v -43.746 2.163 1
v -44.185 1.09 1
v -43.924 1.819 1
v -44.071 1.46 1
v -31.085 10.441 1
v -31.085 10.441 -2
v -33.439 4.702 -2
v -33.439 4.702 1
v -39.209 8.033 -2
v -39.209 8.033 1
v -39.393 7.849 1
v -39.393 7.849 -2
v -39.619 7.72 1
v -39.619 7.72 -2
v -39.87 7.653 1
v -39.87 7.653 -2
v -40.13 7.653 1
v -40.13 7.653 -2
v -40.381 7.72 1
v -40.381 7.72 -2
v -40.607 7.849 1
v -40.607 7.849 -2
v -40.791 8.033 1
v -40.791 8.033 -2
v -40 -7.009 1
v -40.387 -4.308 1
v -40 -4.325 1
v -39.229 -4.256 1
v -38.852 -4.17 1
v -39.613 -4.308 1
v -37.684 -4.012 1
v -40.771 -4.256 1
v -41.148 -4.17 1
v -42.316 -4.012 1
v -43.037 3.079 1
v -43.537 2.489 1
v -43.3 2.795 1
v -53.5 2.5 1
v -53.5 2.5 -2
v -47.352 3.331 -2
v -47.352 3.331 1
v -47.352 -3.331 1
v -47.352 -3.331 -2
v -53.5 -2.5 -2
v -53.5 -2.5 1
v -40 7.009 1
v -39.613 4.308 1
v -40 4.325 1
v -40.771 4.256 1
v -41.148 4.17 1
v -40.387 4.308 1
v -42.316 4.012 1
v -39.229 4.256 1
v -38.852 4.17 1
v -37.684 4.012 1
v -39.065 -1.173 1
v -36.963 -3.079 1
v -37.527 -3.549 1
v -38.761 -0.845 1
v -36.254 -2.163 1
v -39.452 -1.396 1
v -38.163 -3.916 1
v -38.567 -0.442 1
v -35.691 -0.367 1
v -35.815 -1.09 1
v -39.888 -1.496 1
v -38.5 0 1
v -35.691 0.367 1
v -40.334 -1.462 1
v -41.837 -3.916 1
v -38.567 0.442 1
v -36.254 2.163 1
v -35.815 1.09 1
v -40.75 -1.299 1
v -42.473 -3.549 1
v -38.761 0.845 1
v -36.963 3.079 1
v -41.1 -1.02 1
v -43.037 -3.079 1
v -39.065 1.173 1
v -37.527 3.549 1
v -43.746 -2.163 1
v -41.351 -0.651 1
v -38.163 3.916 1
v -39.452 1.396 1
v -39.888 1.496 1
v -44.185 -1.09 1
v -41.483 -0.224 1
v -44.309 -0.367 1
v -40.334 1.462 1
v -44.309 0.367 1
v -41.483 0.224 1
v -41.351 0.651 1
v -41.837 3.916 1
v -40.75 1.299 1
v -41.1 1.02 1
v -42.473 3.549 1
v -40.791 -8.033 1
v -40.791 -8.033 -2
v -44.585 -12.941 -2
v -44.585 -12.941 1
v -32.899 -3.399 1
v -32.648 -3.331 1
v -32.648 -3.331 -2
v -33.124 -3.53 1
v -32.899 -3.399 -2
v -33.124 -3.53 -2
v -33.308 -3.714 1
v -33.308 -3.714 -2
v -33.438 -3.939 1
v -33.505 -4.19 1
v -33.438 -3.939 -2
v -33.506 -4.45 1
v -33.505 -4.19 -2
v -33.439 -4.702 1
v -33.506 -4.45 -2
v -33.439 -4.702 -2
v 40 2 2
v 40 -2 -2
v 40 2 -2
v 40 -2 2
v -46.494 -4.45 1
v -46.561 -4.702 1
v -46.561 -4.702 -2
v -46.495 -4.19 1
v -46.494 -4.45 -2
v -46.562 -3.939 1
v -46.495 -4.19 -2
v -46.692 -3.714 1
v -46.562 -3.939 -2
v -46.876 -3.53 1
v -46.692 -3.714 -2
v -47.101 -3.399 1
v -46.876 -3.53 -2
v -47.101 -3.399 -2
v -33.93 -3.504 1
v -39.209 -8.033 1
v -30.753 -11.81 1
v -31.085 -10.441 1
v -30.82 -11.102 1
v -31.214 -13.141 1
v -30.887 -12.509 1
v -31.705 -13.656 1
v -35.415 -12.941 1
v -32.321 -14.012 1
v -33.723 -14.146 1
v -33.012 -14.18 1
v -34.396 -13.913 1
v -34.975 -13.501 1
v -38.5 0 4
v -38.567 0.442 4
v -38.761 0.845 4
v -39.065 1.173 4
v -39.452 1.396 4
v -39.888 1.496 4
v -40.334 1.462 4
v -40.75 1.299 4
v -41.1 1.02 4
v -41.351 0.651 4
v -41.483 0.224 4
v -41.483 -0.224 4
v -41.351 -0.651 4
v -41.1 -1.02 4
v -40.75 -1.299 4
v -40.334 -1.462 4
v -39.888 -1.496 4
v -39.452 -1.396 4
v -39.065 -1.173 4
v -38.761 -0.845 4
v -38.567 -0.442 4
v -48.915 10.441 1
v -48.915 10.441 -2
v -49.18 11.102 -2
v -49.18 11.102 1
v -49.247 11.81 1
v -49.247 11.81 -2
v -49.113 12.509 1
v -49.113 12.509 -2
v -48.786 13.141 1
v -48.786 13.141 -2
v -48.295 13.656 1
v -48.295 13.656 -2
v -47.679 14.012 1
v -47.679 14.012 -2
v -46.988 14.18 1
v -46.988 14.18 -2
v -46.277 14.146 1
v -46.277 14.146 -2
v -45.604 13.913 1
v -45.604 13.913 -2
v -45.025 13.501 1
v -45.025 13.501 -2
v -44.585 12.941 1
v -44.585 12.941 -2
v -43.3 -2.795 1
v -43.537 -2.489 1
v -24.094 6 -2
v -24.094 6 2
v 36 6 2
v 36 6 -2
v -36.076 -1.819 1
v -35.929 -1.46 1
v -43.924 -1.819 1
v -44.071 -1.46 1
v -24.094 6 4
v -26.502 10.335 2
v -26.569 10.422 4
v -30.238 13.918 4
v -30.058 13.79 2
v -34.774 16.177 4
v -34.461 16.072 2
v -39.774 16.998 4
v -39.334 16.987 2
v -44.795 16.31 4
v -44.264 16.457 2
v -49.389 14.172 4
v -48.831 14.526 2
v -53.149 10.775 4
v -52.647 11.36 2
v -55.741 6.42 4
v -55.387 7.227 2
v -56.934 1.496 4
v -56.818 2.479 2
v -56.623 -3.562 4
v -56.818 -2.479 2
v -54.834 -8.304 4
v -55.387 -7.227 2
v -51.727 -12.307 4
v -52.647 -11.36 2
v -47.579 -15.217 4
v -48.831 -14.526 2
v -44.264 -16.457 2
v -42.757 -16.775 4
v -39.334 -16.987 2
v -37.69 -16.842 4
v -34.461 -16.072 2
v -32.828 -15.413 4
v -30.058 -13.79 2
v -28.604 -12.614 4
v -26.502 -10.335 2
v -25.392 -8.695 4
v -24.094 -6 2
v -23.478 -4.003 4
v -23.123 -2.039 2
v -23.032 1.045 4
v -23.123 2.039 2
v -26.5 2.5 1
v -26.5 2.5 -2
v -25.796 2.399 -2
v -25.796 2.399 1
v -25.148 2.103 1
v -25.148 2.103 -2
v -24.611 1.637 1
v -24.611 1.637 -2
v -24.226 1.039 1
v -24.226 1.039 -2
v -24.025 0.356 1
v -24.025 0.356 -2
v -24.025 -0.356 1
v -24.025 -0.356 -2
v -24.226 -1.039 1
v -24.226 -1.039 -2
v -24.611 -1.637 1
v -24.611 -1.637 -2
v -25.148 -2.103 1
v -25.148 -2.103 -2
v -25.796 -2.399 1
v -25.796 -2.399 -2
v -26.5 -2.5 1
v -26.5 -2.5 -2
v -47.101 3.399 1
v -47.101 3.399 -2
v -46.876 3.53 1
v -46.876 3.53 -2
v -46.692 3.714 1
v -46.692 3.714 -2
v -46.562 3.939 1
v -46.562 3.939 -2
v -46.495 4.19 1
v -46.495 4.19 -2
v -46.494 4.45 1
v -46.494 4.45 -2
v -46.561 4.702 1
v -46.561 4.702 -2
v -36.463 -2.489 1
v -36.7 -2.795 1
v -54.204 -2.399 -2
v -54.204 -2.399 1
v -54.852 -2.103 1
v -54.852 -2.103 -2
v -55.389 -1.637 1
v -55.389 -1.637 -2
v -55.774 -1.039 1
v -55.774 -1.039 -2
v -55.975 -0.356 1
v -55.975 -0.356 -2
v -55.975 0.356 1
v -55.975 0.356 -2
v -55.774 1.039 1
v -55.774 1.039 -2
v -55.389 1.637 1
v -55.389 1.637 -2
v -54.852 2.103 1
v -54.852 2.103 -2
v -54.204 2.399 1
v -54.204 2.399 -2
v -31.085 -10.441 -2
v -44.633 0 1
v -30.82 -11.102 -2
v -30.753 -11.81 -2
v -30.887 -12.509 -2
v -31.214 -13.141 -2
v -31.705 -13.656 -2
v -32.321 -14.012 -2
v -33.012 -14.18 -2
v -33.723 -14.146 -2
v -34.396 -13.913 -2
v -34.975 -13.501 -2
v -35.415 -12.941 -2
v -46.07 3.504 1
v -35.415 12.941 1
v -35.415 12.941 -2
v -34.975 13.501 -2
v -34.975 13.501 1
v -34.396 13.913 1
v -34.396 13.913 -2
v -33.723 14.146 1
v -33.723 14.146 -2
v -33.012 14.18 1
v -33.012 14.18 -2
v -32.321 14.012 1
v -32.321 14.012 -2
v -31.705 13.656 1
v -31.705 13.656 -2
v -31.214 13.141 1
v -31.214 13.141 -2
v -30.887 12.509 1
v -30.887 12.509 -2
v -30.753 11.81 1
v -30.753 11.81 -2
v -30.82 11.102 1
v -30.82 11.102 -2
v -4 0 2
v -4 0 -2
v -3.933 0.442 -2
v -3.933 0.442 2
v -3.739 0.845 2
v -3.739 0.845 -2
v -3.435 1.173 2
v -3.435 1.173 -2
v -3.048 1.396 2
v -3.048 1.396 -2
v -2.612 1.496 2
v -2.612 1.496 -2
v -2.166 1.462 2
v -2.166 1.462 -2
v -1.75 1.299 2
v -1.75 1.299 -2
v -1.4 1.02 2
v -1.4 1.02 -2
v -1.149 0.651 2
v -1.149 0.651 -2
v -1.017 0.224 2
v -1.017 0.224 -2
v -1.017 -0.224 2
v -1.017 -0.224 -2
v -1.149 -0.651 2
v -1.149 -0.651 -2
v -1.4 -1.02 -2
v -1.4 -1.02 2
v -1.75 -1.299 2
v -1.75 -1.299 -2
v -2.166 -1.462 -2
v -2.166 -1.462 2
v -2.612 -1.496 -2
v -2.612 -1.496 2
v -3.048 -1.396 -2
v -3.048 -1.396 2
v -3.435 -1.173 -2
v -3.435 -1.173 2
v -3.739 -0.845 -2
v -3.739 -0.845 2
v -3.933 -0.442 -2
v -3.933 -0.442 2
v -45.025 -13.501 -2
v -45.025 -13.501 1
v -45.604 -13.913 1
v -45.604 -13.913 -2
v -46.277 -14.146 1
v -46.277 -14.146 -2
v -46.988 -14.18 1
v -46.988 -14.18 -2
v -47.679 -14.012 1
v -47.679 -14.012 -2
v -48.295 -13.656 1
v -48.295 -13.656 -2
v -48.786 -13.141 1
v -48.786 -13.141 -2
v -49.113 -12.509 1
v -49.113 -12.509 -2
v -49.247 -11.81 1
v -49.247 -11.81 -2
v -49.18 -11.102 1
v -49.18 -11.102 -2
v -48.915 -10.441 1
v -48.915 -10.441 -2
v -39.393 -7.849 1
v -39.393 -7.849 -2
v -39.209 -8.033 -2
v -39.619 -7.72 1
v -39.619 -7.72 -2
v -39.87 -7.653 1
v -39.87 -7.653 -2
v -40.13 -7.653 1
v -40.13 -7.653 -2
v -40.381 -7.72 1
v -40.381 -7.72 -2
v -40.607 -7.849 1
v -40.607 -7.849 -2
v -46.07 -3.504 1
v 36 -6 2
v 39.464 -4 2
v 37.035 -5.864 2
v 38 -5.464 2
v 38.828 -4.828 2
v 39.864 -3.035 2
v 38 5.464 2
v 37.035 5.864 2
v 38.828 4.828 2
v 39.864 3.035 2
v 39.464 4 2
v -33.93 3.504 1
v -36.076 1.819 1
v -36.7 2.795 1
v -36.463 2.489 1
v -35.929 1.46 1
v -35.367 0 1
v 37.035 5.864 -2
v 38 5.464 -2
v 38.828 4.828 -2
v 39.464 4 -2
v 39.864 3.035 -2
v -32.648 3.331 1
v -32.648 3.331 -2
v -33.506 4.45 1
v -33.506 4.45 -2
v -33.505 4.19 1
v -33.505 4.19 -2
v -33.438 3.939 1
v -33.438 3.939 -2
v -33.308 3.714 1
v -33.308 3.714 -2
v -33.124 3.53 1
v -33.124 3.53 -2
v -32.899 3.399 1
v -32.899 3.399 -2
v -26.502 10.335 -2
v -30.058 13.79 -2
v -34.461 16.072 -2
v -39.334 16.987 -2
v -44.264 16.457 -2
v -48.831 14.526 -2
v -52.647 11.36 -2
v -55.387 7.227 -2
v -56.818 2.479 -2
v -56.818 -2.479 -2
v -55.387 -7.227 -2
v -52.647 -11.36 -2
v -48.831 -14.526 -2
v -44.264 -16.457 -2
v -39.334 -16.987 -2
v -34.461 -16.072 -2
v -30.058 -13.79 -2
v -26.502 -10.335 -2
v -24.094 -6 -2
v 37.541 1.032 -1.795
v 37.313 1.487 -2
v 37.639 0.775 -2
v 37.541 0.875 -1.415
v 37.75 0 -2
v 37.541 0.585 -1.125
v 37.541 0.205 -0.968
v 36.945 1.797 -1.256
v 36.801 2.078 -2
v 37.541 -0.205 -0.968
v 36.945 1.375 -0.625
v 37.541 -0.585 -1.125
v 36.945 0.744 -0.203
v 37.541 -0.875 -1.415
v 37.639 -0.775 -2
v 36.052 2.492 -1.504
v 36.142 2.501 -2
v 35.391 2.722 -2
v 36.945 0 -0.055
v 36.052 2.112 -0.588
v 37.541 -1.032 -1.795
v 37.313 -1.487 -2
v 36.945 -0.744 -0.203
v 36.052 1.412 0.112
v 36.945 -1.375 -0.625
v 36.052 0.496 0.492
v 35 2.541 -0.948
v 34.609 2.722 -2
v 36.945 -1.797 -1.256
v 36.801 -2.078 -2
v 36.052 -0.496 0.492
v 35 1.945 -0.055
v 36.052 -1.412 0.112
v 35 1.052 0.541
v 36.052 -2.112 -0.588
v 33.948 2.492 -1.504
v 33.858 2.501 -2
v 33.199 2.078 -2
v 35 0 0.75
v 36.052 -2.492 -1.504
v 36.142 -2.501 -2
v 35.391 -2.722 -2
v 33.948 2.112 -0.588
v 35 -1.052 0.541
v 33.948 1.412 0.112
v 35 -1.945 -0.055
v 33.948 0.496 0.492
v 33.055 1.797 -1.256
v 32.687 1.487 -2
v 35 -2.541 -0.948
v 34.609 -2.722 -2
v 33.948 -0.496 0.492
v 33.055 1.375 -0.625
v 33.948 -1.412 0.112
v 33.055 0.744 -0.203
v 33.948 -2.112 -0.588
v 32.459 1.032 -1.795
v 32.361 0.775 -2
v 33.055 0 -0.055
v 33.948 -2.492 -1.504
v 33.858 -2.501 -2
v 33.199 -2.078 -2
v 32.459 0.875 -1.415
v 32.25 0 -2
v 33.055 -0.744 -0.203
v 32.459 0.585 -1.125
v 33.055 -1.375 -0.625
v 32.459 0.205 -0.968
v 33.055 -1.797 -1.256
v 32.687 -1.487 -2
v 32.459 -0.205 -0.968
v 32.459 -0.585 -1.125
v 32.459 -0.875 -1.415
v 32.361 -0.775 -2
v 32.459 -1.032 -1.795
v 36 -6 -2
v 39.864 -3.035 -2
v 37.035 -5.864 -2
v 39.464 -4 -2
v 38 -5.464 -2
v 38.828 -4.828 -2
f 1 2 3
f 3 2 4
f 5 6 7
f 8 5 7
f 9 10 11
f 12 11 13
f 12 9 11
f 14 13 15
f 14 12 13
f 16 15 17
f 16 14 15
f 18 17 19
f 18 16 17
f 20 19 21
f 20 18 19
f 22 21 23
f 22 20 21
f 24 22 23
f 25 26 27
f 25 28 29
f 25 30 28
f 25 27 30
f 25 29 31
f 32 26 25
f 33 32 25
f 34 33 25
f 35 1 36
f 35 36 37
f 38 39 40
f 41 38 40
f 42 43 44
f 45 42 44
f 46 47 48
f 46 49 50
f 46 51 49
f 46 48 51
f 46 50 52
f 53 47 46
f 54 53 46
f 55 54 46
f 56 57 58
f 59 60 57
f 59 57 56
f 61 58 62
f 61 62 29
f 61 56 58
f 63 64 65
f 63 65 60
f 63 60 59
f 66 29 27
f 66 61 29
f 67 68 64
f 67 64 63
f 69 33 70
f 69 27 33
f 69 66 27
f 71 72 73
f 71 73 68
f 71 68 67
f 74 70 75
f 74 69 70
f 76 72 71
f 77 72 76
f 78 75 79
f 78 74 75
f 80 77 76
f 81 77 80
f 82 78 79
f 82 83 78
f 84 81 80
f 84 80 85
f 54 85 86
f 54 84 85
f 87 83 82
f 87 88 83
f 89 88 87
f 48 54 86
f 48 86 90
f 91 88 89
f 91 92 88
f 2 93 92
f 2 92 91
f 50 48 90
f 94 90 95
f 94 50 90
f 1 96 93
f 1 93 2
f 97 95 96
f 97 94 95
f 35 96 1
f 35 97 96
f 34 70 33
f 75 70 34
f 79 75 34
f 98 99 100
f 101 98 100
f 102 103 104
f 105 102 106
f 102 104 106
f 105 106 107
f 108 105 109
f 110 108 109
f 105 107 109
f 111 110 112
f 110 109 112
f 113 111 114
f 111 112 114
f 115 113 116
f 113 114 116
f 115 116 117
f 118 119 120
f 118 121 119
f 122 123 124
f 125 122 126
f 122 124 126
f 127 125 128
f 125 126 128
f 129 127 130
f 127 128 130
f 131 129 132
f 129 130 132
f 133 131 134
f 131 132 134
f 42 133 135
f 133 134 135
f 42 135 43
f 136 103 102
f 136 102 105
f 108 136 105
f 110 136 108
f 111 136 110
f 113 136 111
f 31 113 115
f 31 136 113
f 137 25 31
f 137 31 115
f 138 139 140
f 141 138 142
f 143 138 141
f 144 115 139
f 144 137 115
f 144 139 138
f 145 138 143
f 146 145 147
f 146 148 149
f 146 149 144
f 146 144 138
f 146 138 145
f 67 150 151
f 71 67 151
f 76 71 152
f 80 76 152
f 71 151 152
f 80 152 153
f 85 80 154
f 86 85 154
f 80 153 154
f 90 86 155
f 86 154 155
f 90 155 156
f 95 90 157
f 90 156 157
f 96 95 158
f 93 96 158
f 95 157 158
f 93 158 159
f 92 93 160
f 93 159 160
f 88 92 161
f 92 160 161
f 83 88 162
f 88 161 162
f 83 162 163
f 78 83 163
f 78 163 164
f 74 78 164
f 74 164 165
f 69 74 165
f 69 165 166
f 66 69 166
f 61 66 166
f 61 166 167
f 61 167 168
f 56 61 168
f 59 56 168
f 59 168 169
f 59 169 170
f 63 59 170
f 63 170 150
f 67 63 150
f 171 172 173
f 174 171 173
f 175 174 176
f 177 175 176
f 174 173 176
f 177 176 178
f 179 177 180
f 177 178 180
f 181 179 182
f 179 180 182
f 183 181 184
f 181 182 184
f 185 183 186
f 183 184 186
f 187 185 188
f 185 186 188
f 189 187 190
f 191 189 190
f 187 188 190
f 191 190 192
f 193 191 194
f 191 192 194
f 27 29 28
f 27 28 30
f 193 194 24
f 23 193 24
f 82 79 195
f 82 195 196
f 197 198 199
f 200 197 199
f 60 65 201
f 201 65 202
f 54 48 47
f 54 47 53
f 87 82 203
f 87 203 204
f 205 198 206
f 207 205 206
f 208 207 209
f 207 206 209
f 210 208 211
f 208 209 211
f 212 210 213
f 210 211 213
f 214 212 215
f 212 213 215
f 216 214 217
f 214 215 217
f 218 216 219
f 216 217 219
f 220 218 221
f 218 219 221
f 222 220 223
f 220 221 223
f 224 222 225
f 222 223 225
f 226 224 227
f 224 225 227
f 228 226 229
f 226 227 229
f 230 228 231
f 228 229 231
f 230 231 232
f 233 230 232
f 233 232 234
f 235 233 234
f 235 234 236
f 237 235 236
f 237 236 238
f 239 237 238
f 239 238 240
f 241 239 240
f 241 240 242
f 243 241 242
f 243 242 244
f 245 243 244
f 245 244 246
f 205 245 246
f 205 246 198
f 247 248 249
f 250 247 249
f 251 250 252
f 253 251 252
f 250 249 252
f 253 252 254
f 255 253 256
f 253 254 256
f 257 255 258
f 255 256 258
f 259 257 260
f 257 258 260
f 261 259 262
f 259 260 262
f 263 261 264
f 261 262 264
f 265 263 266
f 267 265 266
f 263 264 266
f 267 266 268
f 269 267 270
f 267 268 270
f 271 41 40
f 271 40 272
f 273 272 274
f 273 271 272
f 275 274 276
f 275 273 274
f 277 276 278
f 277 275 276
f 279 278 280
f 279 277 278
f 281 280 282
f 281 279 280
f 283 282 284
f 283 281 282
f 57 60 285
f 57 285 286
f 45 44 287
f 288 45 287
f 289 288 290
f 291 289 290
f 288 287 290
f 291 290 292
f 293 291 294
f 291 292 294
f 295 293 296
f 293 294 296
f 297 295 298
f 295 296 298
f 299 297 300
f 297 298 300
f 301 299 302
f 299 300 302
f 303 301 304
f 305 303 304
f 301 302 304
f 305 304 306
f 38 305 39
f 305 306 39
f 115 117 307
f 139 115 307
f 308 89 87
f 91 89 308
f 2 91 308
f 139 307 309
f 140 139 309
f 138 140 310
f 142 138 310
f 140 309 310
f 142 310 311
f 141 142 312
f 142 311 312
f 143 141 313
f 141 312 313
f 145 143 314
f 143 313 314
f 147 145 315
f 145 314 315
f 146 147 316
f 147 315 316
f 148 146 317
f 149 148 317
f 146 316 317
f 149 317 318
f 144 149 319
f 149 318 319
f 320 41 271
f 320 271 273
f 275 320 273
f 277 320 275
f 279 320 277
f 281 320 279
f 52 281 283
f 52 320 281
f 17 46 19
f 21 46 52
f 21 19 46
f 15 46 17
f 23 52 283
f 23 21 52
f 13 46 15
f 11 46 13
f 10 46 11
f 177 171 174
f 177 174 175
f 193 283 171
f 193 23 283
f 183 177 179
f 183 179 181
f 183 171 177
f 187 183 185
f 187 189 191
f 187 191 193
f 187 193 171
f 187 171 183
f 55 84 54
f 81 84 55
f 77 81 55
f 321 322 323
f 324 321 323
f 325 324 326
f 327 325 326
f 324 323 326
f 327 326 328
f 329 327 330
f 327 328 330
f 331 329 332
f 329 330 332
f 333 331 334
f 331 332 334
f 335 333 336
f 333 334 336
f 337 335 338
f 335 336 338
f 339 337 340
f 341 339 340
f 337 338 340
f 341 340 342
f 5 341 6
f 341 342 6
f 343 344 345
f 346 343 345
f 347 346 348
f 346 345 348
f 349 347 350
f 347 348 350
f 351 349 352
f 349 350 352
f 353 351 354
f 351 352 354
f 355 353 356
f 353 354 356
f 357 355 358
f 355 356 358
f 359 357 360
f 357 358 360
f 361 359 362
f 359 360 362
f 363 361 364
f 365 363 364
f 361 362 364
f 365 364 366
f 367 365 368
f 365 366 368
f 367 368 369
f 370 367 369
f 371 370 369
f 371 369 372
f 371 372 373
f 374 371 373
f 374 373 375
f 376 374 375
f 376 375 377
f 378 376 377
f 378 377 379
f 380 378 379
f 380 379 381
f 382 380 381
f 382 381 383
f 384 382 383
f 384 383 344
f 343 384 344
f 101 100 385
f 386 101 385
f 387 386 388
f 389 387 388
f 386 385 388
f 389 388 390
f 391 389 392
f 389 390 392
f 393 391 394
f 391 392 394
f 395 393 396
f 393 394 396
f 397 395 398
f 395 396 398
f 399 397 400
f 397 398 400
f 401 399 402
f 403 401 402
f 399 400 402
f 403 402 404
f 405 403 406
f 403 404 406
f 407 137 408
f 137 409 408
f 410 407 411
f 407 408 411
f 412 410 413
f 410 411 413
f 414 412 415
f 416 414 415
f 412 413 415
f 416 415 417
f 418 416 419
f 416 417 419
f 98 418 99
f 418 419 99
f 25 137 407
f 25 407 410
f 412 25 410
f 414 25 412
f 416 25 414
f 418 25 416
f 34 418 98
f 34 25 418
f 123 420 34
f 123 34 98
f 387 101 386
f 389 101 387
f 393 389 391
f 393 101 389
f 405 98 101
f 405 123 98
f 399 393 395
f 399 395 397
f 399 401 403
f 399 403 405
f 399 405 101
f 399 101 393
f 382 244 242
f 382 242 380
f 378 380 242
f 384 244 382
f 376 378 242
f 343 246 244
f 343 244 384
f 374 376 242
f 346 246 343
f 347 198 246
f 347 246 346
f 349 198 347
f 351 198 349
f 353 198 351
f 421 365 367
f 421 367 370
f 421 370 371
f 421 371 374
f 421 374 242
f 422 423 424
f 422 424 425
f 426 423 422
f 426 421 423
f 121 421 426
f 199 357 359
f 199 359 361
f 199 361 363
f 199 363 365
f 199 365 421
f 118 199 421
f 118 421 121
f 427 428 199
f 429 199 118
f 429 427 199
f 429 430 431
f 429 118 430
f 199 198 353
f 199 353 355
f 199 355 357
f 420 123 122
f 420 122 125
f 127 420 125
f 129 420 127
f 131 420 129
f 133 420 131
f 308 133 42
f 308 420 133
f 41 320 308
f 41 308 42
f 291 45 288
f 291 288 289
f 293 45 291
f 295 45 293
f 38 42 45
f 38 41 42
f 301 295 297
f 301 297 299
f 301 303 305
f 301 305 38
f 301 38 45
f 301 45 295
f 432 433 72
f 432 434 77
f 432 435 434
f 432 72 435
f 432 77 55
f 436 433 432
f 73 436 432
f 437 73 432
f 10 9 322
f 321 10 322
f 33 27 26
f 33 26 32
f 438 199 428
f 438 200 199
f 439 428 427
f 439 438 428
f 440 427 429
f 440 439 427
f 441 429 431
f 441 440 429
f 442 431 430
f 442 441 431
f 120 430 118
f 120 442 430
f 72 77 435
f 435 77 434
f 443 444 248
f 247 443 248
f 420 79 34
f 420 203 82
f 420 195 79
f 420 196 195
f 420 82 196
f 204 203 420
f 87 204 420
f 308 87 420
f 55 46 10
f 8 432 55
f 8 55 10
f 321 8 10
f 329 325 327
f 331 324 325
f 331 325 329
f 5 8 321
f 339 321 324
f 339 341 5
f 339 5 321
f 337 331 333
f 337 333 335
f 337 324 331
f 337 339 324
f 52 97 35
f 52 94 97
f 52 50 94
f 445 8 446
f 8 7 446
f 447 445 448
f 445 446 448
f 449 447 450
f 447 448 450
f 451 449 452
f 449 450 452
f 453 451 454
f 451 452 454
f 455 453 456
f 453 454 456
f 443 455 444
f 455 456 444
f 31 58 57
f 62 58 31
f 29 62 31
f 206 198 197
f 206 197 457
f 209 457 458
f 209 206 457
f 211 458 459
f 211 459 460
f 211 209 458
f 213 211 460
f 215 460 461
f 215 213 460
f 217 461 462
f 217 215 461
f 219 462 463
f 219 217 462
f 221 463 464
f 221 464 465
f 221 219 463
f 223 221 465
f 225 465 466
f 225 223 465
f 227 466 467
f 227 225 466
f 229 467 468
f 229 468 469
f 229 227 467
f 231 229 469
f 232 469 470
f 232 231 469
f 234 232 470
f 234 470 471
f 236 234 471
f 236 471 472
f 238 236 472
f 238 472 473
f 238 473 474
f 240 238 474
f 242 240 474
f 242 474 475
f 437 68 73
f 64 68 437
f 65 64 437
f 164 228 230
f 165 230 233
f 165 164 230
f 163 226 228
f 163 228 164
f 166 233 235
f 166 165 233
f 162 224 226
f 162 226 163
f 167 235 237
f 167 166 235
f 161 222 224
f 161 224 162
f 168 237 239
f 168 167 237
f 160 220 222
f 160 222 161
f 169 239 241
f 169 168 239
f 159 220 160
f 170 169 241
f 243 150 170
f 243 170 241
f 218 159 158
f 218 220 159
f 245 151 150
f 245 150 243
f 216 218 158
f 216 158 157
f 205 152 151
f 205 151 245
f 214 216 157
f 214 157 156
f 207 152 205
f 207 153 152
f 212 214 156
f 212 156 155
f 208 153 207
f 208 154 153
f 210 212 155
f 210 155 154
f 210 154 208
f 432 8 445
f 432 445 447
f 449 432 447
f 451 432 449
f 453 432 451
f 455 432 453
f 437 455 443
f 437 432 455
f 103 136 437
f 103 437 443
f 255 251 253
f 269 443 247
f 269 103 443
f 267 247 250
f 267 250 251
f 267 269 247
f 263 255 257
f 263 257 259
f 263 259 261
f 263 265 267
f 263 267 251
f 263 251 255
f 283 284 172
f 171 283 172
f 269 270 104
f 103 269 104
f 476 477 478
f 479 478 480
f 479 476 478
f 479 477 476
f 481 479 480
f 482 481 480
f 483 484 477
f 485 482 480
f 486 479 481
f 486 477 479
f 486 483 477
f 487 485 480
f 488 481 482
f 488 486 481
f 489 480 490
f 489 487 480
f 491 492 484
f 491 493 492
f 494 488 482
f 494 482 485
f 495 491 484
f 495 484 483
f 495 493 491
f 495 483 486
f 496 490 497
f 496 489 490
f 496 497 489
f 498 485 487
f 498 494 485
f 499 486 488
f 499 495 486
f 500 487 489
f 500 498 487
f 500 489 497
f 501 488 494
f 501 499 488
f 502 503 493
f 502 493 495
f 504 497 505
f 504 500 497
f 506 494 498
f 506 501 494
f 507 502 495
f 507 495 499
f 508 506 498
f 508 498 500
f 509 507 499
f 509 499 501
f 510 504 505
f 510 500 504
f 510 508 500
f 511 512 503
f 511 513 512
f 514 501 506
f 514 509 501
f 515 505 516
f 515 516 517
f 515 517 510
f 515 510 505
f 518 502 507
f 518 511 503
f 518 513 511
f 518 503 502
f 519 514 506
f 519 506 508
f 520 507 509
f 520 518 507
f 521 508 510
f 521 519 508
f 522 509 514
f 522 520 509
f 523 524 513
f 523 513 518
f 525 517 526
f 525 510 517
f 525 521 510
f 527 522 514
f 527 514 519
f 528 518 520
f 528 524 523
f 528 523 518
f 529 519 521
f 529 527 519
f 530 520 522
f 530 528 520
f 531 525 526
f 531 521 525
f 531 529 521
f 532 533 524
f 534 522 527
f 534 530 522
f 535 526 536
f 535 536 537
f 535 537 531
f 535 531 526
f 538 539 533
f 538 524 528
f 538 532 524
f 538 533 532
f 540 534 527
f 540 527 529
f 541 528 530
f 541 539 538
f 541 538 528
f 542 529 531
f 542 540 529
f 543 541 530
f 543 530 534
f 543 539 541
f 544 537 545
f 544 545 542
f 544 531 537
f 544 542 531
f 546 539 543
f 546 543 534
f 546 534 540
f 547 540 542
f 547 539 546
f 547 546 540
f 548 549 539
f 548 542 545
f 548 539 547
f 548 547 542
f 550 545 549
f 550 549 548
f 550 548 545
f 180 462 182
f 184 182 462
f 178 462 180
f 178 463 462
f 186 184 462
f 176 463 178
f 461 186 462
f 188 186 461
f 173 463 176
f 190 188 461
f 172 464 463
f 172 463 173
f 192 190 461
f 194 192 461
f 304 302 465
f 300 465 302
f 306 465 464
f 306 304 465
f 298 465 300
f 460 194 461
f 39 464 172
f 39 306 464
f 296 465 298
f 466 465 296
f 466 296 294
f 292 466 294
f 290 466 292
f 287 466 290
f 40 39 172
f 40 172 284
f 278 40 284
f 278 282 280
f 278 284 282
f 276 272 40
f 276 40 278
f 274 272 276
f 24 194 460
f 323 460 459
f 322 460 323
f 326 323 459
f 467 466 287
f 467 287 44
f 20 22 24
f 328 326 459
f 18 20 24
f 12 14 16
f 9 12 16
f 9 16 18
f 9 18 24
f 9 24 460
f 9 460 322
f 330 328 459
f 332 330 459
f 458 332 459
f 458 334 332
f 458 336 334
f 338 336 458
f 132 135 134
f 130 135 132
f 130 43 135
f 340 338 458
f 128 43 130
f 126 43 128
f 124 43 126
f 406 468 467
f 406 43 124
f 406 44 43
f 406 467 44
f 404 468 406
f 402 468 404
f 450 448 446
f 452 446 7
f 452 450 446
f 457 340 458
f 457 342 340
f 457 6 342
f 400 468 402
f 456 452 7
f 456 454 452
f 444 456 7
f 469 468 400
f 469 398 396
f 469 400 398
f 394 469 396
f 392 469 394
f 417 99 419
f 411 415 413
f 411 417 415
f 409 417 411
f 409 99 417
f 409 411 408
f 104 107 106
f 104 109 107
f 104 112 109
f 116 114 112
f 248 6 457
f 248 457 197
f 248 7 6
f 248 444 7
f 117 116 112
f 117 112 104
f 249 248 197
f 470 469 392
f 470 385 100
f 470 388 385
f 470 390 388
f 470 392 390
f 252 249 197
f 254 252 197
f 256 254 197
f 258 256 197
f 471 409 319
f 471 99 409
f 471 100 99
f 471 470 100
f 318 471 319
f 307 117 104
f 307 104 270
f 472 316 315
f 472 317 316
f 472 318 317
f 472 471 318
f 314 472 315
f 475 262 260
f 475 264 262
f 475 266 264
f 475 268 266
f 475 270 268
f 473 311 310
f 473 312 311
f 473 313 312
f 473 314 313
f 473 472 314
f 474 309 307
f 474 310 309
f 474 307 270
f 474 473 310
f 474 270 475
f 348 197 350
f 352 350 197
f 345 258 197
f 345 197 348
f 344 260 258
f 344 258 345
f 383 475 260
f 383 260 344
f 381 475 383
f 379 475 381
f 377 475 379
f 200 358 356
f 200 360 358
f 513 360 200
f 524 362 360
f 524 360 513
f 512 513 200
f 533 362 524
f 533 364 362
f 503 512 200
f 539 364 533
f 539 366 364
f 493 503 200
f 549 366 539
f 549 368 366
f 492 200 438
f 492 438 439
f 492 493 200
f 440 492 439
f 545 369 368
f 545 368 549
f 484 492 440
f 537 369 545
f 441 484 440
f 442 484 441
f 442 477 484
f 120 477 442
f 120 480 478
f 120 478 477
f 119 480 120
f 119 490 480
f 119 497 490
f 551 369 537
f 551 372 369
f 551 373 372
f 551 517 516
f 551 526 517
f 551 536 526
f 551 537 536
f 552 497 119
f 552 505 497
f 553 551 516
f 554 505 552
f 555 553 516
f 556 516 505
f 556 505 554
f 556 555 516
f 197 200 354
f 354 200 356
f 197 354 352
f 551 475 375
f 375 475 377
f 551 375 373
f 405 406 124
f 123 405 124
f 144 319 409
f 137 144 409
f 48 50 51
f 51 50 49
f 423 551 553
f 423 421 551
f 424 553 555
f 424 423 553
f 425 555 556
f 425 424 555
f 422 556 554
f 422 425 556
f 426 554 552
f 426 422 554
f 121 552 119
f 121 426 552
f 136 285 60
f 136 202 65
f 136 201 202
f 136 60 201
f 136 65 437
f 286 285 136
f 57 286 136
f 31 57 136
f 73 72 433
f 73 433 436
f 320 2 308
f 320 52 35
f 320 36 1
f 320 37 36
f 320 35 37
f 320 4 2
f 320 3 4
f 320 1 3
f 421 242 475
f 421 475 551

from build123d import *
from build123d.topology import SkipClean

# Parameters (mm, degrees)
SKETCH1_W                       = 80
SKETCH1_H                       = 12
BOSS_EXTRUDE1_DEPTH             = 2
CUT_REVOLVE1_ANGLE              = 180
FILLET2_R                       = 4
BOSS_EXTRUDE2_REACH             = 42.645
SKETCH6_R                       = 17
BOSS_EXTRUDE2_DIRECTION_2_DEPTH = 2
SKETCH7_R                       = 2.5
CUT_EXTRUDE3_DEPTH              = 3
CIRPATTERN1_COUNT               = 6
FILLET3_R                       = 1
CUT_EXTRUDE4_REACH              = 61.783
SKETCH8_R                       = 1.5
CUT_EXTRUDE5_REACH              = 61.783
SKETCH9_R                       = 1.5


with BuildPart() as part:
    # Sketch1 → Boss-Extrude1 (new, symmetric)
    with BuildSketch(Plane.XY):
        Rectangle(SKETCH1_W, SKETCH1_H)
    extrude(amount=BOSS_EXTRUDE1_DEPTH, both=True)

    # Sketch3 → Cut-Revolve1 (revolve, cut)
    with SkipClean():  # the faces are left unmerged after this step: merging them gives an invalid solid
        with BuildSketch(Plane.XY.offset(-2)):
            with BuildLine():
                ThreePointArc((37.75, 0), (35, 2.75), (32.25, 0))
                Line((32.25, 0), (37.75, 0))
            make_face()
            with BuildLine():
                Line((37.75, 0), (32.25, 0))
                ThreePointArc((32.25, 0), (35, -2.75), (37.75, 0))
            make_face()
        revolve(axis=Axis((32.25, 0, -2), (1, 0, 0)), revolution_arc=CUT_REVOLVE1_ANGLE, mode=Mode.SUBTRACT)

    # Fillet2
    fillet2_edges = [part.edges().sort_by_distance(p)[0] for p in [
        (40, -6, 0),
        (40, 6, 0),
    ]]
    fillet(fillet2_edges, radius=FILLET2_R)

    # Boss-Extrude2: up to this face of the body (flat: up to its plane)
    boss_extrude2_end = Plane(part.part.faces().sort_by_distance((-1.183693998, 0, -2))[0])
    # Sketch6 → Boss-Extrude2 (add, up to the picked face)
    with BuildSketch(Plane.XY.offset(2), mode=Mode.PRIVATE) as boss_extrude2_sk1:
        with Locations(Location((-40, 0, 0), (0, 0, 20.667316494))):
            Circle(SKETCH6_R)
    boss_extrude2_tool1 = split(extrude(boss_extrude2_sk1.sketch, amount=-BOSS_EXTRUDE2_REACH, mode=Mode.PRIVATE), bisect_by=boss_extrude2_end, keep=Keep.BOTH, mode=Mode.PRIVATE)
    add(boss_extrude2_tool1.solids().sort_by(Axis((-40, 0, 2), (0, 0, -1)))[0])

    # Sketch6 → Boss-Extrude2 direction 2 (add)
    with BuildSketch(Plane.XY.offset(2)):
        with Locations(Location((-40, 0, 0), (0, 0, 20.667316494))):
            Circle(SKETCH6_R)
    extrude(amount=BOSS_EXTRUDE2_DIRECTION_2_DEPTH)

    # Sketch7 → Cut-Extrude3 (cut)
    with BuildSketch(Plane(origin=(0, 0, -2), x_dir=(-1, 0, 0), z_dir=(0, 0, -1))):
        with BuildLine():
            Line((41.148365434, 4.169758006), (40, 4.325))
            ThreePointArc((40, 4.325), (35.675, 0), (40, -4.325))
            Line((40, -4.325), (41.148365434, -4.169758006))
            ThreePointArc((41.148365434, -4.169758006), (43.440371019, -2.620967808), (44.325, 0))
            ThreePointArc((44.325, 0), (43.440371019, 2.620967808), (41.148365434, 4.169758006))
        make_face()
        with BuildLine():
            Line((53.5, 2.5), (41.148365434, 4.169758006))
            ThreePointArc((41.148365434, 4.169758006), (43.440371019, 2.620967808), (44.325, 0))
            ThreePointArc((44.325, 0), (43.440371019, -2.620967808), (41.148365434, -4.169758006))
            Line((41.148365434, -4.169758006), (53.5, -2.5))
            ThreePointArc((53.5, -2.5), (51, 0), (53.5, 2.5))
        make_face()
        with Locations((53.5, 0)):
            Circle(SKETCH7_R)
    cut_extrude3 = extrude(amount=-CUT_EXTRUDE3_DEPTH, mode=Mode.SUBTRACT)

    # CirPattern1: Cut-Extrude3 ×6 about axis
    cirpattern1_axis = Axis((-40, 0, 0), (0, 0, 1))
    for i in range(1, CIRPATTERN1_COUNT):
        add(cut_extrude3.rotate(cirpattern1_axis, i * 360 / CIRPATTERN1_COUNT), mode=Mode.SUBTRACT)

    # Fillet3
    fillet3_edges = [part.edges().sort_by_distance(p)[0] for p in [
        (-46.069873399, 3.504443041, -0.5),
        (-40, 7.008886081, -0.5),
        (-33.930126601, 3.504443041, -0.5),
        (-33.930126601, -3.504443041, -0.5),
        (-40, -7.008886081, -0.5),
        (-46.069873399, -3.504443041, -0.5),
    ]]
    fillet(fillet3_edges, radius=FILLET3_R)

    # Sketch8 → Cut-Extrude4 (cut, up to next)
    with BuildSketch(Plane.XY.offset(4), mode=Mode.PRIVATE) as cut_extrude4_sk1:
        with Locations((-40, 0)):
            Circle(SKETCH8_R)
    cut_extrude4_tool1 = extrude(cut_extrude4_sk1.sketch, amount=-CUT_EXTRUDE4_REACH, mode=Mode.PRIVATE) & part.part
    add(cut_extrude4_tool1.solids().sort_by_distance((-40, 0, 4))[0], mode=Mode.SUBTRACT)

    # Sketch9 → Cut-Extrude5 (cut, up to next)
    with BuildSketch(Plane(origin=(0, 0, -2), x_dir=(-1, 0, 0), z_dir=(0, 0, -1)), mode=Mode.PRIVATE) as cut_extrude5_sk1:
        with Locations((2.5, 0)):
            Circle(SKETCH9_R)
    cut_extrude5_tool1 = extrude(cut_extrude5_sk1.sketch, amount=-CUT_EXTRUDE5_REACH, mode=Mode.PRIVATE) & part.part
    add(cut_extrude5_tool1.solids().sort_by_distance((-2.5, 0, -2))[0], mode=Mode.SUBTRACT)


solid = part.part
